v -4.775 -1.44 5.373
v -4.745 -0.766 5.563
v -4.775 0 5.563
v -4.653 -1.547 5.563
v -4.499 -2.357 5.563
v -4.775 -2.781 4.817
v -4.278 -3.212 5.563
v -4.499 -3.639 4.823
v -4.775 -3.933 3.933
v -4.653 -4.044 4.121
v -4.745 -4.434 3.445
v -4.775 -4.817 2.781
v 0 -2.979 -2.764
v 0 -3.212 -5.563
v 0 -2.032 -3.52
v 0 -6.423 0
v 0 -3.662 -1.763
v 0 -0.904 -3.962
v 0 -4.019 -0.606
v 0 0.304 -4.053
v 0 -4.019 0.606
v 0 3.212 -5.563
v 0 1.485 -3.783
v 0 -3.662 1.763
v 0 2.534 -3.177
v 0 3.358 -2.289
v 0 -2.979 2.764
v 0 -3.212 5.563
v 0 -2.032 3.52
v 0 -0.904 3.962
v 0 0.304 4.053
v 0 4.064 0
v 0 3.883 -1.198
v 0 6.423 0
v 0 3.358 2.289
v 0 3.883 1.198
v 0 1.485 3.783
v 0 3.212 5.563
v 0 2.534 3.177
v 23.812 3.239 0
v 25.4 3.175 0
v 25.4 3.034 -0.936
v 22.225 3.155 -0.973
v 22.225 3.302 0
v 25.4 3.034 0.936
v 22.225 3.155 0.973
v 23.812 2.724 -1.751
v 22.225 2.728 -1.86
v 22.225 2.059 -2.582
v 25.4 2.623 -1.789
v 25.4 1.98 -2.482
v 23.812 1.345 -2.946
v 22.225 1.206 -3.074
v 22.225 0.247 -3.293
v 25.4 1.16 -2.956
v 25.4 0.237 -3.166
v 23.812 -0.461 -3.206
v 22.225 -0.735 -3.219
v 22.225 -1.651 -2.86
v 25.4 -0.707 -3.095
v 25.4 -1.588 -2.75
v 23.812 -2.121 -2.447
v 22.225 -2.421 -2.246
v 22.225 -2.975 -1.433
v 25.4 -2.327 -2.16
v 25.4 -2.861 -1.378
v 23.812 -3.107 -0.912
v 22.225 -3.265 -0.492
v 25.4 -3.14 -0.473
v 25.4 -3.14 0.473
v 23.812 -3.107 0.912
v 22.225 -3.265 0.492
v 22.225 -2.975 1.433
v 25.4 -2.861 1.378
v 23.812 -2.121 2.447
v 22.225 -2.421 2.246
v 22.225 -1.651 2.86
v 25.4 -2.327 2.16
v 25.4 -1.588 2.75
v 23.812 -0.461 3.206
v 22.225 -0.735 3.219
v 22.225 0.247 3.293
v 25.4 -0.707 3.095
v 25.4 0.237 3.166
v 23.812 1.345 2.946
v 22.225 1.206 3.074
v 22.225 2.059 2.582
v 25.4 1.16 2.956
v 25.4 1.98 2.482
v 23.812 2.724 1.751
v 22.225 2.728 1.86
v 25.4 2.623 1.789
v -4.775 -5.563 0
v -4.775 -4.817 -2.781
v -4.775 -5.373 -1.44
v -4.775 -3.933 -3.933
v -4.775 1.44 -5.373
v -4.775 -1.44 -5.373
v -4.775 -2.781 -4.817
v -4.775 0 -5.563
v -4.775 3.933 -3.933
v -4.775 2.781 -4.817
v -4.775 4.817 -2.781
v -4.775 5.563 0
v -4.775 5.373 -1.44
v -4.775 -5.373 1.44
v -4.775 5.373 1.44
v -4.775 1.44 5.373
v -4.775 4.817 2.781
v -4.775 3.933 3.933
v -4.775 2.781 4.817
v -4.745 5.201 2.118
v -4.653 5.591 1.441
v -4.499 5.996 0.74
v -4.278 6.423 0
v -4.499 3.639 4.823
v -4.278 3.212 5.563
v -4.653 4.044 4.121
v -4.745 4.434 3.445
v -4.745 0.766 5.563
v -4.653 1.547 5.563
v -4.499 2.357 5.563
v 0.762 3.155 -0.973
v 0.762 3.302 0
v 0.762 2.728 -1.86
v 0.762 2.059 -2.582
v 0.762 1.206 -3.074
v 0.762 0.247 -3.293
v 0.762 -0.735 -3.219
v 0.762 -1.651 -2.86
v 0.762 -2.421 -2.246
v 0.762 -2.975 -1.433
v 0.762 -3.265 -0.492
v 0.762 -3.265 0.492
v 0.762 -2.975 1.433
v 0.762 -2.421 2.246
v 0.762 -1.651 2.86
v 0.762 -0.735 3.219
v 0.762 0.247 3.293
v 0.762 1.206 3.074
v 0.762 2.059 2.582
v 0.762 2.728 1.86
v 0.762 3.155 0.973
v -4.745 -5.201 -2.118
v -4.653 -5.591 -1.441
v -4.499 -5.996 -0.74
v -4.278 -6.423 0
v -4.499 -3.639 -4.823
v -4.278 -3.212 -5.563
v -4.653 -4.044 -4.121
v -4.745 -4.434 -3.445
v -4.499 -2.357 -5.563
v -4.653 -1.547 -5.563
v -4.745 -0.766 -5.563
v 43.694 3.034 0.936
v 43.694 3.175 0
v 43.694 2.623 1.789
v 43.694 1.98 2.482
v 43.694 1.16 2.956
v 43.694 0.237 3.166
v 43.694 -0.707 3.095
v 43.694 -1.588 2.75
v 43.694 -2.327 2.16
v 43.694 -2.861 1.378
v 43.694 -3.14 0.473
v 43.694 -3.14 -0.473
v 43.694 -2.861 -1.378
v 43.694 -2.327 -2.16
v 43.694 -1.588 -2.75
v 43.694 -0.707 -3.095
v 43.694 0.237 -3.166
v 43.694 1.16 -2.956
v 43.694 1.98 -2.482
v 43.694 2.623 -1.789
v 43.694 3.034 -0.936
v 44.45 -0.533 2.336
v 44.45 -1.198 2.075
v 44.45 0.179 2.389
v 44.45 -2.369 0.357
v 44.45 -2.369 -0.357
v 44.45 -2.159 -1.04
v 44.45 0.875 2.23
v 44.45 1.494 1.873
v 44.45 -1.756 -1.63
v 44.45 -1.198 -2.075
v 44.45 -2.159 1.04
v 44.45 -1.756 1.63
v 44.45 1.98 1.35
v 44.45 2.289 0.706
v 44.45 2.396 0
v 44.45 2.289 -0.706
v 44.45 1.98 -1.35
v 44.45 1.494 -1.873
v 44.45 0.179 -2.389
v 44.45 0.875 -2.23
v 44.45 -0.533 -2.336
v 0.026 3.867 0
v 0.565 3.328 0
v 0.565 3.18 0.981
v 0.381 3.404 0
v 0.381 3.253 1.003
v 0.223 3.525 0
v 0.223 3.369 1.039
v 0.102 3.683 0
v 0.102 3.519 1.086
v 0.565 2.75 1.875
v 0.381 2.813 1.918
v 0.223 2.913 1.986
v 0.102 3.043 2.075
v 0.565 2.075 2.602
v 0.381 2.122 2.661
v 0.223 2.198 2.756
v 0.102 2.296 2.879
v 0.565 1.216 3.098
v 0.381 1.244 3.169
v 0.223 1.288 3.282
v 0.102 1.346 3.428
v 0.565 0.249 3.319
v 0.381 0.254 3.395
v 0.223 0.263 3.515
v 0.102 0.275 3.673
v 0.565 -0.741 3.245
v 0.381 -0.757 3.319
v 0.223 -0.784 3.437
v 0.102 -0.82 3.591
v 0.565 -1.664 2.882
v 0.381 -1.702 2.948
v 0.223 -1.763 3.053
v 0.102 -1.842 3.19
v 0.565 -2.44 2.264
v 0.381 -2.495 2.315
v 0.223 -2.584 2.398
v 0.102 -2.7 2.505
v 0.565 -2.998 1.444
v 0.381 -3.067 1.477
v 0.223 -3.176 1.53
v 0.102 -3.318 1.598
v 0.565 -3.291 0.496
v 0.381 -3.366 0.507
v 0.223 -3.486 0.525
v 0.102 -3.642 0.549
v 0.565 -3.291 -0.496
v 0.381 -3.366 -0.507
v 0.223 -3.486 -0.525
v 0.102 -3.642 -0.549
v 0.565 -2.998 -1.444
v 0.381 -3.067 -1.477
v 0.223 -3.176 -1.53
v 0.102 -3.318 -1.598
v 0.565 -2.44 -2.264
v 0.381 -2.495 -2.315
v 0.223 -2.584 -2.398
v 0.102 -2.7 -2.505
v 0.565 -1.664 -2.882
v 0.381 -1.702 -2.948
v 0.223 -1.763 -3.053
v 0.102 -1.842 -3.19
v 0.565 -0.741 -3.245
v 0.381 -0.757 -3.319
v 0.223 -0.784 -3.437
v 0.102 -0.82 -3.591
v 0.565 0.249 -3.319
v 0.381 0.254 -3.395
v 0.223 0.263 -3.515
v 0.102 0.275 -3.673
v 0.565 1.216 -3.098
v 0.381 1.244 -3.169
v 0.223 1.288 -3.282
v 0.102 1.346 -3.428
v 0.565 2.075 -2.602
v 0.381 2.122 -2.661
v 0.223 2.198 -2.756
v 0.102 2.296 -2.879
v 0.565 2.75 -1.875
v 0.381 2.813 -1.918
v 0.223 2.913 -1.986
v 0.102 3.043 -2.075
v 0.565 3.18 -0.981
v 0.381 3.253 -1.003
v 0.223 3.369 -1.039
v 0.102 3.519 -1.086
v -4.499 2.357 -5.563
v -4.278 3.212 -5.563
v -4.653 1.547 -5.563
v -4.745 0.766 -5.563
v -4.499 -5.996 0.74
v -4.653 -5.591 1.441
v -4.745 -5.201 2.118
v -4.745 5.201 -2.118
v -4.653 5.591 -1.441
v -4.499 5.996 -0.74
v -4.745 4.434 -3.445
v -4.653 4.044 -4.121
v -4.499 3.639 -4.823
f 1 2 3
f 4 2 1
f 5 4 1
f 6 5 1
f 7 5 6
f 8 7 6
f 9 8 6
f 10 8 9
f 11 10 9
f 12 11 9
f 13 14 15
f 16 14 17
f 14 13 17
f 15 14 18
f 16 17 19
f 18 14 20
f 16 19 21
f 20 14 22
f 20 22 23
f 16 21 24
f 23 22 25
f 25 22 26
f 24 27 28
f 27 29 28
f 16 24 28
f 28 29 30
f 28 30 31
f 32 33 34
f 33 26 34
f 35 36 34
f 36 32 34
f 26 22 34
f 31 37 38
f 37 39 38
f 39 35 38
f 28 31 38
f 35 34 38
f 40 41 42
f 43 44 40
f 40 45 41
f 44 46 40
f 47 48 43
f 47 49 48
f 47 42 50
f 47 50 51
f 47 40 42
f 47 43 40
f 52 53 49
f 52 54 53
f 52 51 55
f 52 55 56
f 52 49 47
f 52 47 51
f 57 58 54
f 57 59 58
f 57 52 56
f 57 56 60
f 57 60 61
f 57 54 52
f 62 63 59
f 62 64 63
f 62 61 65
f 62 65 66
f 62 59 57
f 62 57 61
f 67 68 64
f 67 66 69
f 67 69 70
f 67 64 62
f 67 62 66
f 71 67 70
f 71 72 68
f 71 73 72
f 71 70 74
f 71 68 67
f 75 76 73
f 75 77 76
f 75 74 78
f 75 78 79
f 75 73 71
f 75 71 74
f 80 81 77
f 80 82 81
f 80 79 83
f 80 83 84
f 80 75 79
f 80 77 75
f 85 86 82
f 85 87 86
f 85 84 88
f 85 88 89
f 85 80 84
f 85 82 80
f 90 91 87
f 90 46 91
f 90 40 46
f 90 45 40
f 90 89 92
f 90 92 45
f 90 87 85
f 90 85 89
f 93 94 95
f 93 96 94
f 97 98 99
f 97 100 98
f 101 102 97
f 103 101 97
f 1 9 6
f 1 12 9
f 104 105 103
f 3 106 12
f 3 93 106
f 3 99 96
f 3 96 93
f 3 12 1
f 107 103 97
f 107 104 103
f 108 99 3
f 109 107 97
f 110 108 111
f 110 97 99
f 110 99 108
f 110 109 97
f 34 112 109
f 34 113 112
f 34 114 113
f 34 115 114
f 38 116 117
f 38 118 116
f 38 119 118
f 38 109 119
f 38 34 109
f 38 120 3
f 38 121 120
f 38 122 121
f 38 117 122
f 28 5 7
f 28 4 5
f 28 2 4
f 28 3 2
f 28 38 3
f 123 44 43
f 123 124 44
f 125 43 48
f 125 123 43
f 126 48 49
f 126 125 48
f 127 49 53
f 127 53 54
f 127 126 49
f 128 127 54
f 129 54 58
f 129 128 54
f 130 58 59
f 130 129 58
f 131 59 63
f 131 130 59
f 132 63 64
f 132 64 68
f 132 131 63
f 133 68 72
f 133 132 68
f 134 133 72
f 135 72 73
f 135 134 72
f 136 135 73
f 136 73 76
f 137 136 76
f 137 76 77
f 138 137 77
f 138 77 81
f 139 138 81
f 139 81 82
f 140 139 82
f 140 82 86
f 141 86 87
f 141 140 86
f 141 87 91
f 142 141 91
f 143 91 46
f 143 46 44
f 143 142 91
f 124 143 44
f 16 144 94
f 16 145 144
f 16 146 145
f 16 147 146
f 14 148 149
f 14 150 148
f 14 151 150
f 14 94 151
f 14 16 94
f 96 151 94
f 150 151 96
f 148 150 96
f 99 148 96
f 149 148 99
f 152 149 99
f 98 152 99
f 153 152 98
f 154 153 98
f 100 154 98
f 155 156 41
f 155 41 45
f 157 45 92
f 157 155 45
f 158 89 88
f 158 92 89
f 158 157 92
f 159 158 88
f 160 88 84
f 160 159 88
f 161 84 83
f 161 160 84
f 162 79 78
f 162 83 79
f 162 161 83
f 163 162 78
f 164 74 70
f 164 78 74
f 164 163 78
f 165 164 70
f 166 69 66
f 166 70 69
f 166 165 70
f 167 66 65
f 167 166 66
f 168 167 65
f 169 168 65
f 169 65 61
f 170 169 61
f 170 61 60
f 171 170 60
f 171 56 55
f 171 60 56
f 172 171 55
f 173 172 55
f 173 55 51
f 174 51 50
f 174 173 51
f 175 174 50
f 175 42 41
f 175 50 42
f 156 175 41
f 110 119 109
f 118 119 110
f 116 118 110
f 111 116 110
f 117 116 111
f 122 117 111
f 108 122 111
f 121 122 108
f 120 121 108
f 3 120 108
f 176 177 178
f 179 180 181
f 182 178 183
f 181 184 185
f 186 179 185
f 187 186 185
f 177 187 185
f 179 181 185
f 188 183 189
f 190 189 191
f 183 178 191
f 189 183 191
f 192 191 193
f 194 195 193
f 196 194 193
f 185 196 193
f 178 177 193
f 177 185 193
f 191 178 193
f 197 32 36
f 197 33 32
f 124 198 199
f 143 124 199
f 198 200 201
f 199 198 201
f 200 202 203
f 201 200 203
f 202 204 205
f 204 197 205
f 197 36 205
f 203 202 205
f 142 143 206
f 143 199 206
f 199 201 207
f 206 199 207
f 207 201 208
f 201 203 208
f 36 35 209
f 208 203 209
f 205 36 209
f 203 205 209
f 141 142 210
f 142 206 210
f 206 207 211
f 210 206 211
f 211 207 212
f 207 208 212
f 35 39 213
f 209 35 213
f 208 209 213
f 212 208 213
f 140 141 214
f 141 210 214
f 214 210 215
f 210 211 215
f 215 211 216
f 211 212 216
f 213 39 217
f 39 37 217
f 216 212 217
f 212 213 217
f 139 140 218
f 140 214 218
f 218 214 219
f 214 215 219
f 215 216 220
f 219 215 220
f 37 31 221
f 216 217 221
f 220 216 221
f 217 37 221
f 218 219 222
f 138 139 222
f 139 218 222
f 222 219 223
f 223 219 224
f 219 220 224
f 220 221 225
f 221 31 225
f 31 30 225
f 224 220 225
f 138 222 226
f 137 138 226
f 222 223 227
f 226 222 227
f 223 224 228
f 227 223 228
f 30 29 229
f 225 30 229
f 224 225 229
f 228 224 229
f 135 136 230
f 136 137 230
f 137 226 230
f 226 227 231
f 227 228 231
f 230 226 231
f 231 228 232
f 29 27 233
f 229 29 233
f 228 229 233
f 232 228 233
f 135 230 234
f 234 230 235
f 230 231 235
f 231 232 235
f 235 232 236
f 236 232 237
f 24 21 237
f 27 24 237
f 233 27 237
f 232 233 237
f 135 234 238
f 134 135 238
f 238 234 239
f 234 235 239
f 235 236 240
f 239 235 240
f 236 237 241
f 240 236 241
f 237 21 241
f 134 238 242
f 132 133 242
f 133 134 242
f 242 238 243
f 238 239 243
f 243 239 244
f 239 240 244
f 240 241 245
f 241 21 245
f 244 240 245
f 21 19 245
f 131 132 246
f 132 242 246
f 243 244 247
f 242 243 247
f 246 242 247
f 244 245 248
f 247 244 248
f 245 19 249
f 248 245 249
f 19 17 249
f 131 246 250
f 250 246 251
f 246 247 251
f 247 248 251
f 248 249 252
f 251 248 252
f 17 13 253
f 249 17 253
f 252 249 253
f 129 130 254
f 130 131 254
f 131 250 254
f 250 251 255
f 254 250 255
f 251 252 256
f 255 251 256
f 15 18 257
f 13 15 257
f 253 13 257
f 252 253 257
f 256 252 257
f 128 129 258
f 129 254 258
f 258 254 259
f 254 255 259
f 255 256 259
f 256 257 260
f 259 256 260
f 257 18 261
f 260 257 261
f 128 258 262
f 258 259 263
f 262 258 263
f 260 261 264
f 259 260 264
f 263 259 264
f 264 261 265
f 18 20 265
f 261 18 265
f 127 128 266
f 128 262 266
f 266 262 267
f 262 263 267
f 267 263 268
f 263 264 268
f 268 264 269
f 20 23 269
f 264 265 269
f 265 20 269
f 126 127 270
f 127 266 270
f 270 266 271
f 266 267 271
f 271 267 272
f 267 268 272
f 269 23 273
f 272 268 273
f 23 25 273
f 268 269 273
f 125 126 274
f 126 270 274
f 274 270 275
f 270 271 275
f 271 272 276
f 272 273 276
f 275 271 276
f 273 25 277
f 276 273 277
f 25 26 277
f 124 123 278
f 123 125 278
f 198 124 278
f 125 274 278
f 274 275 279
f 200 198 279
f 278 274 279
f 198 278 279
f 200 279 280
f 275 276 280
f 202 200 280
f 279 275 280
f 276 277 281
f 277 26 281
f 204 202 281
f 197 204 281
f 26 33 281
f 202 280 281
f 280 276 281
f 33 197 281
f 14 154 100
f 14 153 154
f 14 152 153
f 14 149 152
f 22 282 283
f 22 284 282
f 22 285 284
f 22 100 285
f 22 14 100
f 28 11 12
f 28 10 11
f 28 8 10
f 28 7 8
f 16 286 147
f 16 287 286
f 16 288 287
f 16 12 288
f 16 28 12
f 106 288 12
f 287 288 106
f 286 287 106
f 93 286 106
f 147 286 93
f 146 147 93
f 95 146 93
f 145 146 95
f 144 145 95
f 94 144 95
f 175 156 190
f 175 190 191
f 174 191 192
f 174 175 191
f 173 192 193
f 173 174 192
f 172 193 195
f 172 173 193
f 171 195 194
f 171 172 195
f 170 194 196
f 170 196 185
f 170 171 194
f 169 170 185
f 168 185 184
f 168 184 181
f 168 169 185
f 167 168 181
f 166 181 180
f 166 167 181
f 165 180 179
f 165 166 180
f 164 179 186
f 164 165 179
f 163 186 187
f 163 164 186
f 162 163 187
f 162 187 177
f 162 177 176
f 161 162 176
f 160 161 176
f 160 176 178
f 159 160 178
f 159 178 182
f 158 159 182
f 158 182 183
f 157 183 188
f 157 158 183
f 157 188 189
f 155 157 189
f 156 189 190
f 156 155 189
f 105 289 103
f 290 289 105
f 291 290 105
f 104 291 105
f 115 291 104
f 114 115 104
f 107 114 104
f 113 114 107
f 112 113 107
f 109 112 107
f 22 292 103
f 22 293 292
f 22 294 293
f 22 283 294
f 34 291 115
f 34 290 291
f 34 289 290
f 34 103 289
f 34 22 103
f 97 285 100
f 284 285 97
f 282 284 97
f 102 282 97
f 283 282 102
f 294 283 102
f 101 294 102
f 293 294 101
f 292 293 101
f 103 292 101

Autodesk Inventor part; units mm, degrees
ref_plane "YZ Plane" through (0, 0, 0) normal (1, 0, 0) x (0, 1, 0)
ref_plane "XZ Plane" through (0, 0, 0) normal (0, 1, 0) x (-1, 0, 0)
sketch "Sketch1" plane through (0, 0, 0) normal (0, 0, 1) x (1, 0, 0)
  line L0 (0, 5.5626) -> (0, 3.302)
  line L1 (25.4, 3.175) -> (44.45, 3.175)
  line L2 (44.45, 3.175) -> (44.45, 0)
  line L3 (44.45, 0) -> (-0.0001, 0)
  line L4 (-8.8901, 0) -> (53.34, 0) projected
  line L5 (-0.0001, 0) -> (-0.0001, 5.5626)
  line L6 (-0.0001, 5.5626) -> (0, 5.5626)
  line L7 (25.4, 3.175) -> (22.2249, 3.302)
  line L8 (22.2249, 3.302) -> (0, 3.302)
  line L9 (0, -1.1125) -> (0, 6.6751) projected
  dimension "d0" = 44.45
  dimension "d1" = 19.05
  dimension "d2" = 6.35
  dimension "d9" = 0.0001
  dimension "d10" = 11.1252
  dimension "d13" = 3.1751
  dimension "d14" = 6.604
revolve "Body" add sketch "Sketch1" angle 360 about axis through (44.45, 0, 0) along (-1, 0, 0)
sketch "Sketch2" plane through (-0.0001, 0, 0) normal (-1, 0, 0) x (0, 0, 1)
  line L0 (0, 6.4231) -> (5.5626, 3.2116)
  line L1 (5.5626, 3.2116) -> (5.5626, -3.2116)
  line L2 (5.5626, -3.2116) -> (0, -6.4231)
  line L3 (0, -6.4231) -> (-5.5626, -3.2116)
  line L4 (-5.5626, -3.2116) -> (-5.5626, 3.2116)
  line L5 (-5.5626, 3.2116) -> (0, 6.4231)
  point P0 (0, 0)
  point P1 (0, 0)
  dimension "d11" = 11.1252
extrude "Head" add sketch "Sketch2" along normal blind 4.7752
sketch "Sketch4" plane through (0, 0, 0) normal (0, 0, 1) x (1, 0, 0)
  line L0 (-4.7753, 5.5626) -> (-4.7753, 6.4231)
  line L1 (-4.7753, 6.4231) -> (-4.2785, 6.4231)
  line L2 (-4.2785, 6.4231) -> (-4.7753, 5.5626)
  line L3 (-5.7303, 0) -> (0.9549, 0) projected
  line L4 (-0.0001, 6.4231) -> (-4.7753, 6.4231) projected
  line L5 (-4.7753, 3.2116) -> (-4.7753, 6.4231) projected
  dimension "d5" = 30
  dimension "d19" = 11.1252
revolve "Chamfer1" cut sketch "Sketch4" angle 360 about axis through (-10, 0, 0) along (1, 0, 0)
thread "Thread" size "1/4-20 UNC" class "2A" standard "ANSI Unified Screw Threads" length 19.05
chamfer "Chamfer2" distance 0.7791 distance2 0.7557 1 edges at (44.45, -3.175, 0) measured on face at (44.45, -0.7017, 0.0433)
ref_plane "Work Plane1" through (1.525, 0, 0) normal (0, 0, 1) x (1, 0, 0)
fillet "Fillet2" radius 0.762 1 edges at (0, -3.302, 0)
equation "\"d0\" = NLG"
equation "\"d1\" = GEL"
equation "\"d2\" = GD"
equation "\"d10\" = SD2"
equation "\"d14\" = BDM"
equation "\"d11\" = SW"
equation "\"d3\" = KOH - SD"
equation "\"d5\" = ANG1"
equation "\"d19\" = SW0"
equation "\"d63\" = R"
equation "\"d15\" = GEL"
equation "\"d6\" = -0.5 * SPD + 0.5 * GD"
equation "\"NLG\" = 44.45"
equation "\"GD\" = NND"
equation "\"BDM\" = 6.604"
equation "\"KOH\" = 4.7752"
equation "\"GEL\" = 19.05"
equation "\"SW\" = 11.1252"
equation "\"SW0\" = SW"
equation "\"SPD\" = GD1"
equation "\"SD2\" = SW"
equation "\"SD\" = 0"
equation "\"ANG1\" = 30deg"
equation "\"GAL\" = 3.175"
equation "\"GUL\" = 0.238 * GAL"
equation "\"R\" = 0.762"
equation "\"d62\" = -NLG - SD + GUL"
equation "\"GD1\" = 4.79184"
equation "\"THREADDIA\" = 6.35"
equation "\"TOA\" = 30deg"
equation "\"NND\" = 6.35"
equation "\"E0\" = 1.155 * SW"
properties part number "ANSI/ASME B18.2.1 - 1/4-20 UNC - 1.75" material "Steel, Mild"
